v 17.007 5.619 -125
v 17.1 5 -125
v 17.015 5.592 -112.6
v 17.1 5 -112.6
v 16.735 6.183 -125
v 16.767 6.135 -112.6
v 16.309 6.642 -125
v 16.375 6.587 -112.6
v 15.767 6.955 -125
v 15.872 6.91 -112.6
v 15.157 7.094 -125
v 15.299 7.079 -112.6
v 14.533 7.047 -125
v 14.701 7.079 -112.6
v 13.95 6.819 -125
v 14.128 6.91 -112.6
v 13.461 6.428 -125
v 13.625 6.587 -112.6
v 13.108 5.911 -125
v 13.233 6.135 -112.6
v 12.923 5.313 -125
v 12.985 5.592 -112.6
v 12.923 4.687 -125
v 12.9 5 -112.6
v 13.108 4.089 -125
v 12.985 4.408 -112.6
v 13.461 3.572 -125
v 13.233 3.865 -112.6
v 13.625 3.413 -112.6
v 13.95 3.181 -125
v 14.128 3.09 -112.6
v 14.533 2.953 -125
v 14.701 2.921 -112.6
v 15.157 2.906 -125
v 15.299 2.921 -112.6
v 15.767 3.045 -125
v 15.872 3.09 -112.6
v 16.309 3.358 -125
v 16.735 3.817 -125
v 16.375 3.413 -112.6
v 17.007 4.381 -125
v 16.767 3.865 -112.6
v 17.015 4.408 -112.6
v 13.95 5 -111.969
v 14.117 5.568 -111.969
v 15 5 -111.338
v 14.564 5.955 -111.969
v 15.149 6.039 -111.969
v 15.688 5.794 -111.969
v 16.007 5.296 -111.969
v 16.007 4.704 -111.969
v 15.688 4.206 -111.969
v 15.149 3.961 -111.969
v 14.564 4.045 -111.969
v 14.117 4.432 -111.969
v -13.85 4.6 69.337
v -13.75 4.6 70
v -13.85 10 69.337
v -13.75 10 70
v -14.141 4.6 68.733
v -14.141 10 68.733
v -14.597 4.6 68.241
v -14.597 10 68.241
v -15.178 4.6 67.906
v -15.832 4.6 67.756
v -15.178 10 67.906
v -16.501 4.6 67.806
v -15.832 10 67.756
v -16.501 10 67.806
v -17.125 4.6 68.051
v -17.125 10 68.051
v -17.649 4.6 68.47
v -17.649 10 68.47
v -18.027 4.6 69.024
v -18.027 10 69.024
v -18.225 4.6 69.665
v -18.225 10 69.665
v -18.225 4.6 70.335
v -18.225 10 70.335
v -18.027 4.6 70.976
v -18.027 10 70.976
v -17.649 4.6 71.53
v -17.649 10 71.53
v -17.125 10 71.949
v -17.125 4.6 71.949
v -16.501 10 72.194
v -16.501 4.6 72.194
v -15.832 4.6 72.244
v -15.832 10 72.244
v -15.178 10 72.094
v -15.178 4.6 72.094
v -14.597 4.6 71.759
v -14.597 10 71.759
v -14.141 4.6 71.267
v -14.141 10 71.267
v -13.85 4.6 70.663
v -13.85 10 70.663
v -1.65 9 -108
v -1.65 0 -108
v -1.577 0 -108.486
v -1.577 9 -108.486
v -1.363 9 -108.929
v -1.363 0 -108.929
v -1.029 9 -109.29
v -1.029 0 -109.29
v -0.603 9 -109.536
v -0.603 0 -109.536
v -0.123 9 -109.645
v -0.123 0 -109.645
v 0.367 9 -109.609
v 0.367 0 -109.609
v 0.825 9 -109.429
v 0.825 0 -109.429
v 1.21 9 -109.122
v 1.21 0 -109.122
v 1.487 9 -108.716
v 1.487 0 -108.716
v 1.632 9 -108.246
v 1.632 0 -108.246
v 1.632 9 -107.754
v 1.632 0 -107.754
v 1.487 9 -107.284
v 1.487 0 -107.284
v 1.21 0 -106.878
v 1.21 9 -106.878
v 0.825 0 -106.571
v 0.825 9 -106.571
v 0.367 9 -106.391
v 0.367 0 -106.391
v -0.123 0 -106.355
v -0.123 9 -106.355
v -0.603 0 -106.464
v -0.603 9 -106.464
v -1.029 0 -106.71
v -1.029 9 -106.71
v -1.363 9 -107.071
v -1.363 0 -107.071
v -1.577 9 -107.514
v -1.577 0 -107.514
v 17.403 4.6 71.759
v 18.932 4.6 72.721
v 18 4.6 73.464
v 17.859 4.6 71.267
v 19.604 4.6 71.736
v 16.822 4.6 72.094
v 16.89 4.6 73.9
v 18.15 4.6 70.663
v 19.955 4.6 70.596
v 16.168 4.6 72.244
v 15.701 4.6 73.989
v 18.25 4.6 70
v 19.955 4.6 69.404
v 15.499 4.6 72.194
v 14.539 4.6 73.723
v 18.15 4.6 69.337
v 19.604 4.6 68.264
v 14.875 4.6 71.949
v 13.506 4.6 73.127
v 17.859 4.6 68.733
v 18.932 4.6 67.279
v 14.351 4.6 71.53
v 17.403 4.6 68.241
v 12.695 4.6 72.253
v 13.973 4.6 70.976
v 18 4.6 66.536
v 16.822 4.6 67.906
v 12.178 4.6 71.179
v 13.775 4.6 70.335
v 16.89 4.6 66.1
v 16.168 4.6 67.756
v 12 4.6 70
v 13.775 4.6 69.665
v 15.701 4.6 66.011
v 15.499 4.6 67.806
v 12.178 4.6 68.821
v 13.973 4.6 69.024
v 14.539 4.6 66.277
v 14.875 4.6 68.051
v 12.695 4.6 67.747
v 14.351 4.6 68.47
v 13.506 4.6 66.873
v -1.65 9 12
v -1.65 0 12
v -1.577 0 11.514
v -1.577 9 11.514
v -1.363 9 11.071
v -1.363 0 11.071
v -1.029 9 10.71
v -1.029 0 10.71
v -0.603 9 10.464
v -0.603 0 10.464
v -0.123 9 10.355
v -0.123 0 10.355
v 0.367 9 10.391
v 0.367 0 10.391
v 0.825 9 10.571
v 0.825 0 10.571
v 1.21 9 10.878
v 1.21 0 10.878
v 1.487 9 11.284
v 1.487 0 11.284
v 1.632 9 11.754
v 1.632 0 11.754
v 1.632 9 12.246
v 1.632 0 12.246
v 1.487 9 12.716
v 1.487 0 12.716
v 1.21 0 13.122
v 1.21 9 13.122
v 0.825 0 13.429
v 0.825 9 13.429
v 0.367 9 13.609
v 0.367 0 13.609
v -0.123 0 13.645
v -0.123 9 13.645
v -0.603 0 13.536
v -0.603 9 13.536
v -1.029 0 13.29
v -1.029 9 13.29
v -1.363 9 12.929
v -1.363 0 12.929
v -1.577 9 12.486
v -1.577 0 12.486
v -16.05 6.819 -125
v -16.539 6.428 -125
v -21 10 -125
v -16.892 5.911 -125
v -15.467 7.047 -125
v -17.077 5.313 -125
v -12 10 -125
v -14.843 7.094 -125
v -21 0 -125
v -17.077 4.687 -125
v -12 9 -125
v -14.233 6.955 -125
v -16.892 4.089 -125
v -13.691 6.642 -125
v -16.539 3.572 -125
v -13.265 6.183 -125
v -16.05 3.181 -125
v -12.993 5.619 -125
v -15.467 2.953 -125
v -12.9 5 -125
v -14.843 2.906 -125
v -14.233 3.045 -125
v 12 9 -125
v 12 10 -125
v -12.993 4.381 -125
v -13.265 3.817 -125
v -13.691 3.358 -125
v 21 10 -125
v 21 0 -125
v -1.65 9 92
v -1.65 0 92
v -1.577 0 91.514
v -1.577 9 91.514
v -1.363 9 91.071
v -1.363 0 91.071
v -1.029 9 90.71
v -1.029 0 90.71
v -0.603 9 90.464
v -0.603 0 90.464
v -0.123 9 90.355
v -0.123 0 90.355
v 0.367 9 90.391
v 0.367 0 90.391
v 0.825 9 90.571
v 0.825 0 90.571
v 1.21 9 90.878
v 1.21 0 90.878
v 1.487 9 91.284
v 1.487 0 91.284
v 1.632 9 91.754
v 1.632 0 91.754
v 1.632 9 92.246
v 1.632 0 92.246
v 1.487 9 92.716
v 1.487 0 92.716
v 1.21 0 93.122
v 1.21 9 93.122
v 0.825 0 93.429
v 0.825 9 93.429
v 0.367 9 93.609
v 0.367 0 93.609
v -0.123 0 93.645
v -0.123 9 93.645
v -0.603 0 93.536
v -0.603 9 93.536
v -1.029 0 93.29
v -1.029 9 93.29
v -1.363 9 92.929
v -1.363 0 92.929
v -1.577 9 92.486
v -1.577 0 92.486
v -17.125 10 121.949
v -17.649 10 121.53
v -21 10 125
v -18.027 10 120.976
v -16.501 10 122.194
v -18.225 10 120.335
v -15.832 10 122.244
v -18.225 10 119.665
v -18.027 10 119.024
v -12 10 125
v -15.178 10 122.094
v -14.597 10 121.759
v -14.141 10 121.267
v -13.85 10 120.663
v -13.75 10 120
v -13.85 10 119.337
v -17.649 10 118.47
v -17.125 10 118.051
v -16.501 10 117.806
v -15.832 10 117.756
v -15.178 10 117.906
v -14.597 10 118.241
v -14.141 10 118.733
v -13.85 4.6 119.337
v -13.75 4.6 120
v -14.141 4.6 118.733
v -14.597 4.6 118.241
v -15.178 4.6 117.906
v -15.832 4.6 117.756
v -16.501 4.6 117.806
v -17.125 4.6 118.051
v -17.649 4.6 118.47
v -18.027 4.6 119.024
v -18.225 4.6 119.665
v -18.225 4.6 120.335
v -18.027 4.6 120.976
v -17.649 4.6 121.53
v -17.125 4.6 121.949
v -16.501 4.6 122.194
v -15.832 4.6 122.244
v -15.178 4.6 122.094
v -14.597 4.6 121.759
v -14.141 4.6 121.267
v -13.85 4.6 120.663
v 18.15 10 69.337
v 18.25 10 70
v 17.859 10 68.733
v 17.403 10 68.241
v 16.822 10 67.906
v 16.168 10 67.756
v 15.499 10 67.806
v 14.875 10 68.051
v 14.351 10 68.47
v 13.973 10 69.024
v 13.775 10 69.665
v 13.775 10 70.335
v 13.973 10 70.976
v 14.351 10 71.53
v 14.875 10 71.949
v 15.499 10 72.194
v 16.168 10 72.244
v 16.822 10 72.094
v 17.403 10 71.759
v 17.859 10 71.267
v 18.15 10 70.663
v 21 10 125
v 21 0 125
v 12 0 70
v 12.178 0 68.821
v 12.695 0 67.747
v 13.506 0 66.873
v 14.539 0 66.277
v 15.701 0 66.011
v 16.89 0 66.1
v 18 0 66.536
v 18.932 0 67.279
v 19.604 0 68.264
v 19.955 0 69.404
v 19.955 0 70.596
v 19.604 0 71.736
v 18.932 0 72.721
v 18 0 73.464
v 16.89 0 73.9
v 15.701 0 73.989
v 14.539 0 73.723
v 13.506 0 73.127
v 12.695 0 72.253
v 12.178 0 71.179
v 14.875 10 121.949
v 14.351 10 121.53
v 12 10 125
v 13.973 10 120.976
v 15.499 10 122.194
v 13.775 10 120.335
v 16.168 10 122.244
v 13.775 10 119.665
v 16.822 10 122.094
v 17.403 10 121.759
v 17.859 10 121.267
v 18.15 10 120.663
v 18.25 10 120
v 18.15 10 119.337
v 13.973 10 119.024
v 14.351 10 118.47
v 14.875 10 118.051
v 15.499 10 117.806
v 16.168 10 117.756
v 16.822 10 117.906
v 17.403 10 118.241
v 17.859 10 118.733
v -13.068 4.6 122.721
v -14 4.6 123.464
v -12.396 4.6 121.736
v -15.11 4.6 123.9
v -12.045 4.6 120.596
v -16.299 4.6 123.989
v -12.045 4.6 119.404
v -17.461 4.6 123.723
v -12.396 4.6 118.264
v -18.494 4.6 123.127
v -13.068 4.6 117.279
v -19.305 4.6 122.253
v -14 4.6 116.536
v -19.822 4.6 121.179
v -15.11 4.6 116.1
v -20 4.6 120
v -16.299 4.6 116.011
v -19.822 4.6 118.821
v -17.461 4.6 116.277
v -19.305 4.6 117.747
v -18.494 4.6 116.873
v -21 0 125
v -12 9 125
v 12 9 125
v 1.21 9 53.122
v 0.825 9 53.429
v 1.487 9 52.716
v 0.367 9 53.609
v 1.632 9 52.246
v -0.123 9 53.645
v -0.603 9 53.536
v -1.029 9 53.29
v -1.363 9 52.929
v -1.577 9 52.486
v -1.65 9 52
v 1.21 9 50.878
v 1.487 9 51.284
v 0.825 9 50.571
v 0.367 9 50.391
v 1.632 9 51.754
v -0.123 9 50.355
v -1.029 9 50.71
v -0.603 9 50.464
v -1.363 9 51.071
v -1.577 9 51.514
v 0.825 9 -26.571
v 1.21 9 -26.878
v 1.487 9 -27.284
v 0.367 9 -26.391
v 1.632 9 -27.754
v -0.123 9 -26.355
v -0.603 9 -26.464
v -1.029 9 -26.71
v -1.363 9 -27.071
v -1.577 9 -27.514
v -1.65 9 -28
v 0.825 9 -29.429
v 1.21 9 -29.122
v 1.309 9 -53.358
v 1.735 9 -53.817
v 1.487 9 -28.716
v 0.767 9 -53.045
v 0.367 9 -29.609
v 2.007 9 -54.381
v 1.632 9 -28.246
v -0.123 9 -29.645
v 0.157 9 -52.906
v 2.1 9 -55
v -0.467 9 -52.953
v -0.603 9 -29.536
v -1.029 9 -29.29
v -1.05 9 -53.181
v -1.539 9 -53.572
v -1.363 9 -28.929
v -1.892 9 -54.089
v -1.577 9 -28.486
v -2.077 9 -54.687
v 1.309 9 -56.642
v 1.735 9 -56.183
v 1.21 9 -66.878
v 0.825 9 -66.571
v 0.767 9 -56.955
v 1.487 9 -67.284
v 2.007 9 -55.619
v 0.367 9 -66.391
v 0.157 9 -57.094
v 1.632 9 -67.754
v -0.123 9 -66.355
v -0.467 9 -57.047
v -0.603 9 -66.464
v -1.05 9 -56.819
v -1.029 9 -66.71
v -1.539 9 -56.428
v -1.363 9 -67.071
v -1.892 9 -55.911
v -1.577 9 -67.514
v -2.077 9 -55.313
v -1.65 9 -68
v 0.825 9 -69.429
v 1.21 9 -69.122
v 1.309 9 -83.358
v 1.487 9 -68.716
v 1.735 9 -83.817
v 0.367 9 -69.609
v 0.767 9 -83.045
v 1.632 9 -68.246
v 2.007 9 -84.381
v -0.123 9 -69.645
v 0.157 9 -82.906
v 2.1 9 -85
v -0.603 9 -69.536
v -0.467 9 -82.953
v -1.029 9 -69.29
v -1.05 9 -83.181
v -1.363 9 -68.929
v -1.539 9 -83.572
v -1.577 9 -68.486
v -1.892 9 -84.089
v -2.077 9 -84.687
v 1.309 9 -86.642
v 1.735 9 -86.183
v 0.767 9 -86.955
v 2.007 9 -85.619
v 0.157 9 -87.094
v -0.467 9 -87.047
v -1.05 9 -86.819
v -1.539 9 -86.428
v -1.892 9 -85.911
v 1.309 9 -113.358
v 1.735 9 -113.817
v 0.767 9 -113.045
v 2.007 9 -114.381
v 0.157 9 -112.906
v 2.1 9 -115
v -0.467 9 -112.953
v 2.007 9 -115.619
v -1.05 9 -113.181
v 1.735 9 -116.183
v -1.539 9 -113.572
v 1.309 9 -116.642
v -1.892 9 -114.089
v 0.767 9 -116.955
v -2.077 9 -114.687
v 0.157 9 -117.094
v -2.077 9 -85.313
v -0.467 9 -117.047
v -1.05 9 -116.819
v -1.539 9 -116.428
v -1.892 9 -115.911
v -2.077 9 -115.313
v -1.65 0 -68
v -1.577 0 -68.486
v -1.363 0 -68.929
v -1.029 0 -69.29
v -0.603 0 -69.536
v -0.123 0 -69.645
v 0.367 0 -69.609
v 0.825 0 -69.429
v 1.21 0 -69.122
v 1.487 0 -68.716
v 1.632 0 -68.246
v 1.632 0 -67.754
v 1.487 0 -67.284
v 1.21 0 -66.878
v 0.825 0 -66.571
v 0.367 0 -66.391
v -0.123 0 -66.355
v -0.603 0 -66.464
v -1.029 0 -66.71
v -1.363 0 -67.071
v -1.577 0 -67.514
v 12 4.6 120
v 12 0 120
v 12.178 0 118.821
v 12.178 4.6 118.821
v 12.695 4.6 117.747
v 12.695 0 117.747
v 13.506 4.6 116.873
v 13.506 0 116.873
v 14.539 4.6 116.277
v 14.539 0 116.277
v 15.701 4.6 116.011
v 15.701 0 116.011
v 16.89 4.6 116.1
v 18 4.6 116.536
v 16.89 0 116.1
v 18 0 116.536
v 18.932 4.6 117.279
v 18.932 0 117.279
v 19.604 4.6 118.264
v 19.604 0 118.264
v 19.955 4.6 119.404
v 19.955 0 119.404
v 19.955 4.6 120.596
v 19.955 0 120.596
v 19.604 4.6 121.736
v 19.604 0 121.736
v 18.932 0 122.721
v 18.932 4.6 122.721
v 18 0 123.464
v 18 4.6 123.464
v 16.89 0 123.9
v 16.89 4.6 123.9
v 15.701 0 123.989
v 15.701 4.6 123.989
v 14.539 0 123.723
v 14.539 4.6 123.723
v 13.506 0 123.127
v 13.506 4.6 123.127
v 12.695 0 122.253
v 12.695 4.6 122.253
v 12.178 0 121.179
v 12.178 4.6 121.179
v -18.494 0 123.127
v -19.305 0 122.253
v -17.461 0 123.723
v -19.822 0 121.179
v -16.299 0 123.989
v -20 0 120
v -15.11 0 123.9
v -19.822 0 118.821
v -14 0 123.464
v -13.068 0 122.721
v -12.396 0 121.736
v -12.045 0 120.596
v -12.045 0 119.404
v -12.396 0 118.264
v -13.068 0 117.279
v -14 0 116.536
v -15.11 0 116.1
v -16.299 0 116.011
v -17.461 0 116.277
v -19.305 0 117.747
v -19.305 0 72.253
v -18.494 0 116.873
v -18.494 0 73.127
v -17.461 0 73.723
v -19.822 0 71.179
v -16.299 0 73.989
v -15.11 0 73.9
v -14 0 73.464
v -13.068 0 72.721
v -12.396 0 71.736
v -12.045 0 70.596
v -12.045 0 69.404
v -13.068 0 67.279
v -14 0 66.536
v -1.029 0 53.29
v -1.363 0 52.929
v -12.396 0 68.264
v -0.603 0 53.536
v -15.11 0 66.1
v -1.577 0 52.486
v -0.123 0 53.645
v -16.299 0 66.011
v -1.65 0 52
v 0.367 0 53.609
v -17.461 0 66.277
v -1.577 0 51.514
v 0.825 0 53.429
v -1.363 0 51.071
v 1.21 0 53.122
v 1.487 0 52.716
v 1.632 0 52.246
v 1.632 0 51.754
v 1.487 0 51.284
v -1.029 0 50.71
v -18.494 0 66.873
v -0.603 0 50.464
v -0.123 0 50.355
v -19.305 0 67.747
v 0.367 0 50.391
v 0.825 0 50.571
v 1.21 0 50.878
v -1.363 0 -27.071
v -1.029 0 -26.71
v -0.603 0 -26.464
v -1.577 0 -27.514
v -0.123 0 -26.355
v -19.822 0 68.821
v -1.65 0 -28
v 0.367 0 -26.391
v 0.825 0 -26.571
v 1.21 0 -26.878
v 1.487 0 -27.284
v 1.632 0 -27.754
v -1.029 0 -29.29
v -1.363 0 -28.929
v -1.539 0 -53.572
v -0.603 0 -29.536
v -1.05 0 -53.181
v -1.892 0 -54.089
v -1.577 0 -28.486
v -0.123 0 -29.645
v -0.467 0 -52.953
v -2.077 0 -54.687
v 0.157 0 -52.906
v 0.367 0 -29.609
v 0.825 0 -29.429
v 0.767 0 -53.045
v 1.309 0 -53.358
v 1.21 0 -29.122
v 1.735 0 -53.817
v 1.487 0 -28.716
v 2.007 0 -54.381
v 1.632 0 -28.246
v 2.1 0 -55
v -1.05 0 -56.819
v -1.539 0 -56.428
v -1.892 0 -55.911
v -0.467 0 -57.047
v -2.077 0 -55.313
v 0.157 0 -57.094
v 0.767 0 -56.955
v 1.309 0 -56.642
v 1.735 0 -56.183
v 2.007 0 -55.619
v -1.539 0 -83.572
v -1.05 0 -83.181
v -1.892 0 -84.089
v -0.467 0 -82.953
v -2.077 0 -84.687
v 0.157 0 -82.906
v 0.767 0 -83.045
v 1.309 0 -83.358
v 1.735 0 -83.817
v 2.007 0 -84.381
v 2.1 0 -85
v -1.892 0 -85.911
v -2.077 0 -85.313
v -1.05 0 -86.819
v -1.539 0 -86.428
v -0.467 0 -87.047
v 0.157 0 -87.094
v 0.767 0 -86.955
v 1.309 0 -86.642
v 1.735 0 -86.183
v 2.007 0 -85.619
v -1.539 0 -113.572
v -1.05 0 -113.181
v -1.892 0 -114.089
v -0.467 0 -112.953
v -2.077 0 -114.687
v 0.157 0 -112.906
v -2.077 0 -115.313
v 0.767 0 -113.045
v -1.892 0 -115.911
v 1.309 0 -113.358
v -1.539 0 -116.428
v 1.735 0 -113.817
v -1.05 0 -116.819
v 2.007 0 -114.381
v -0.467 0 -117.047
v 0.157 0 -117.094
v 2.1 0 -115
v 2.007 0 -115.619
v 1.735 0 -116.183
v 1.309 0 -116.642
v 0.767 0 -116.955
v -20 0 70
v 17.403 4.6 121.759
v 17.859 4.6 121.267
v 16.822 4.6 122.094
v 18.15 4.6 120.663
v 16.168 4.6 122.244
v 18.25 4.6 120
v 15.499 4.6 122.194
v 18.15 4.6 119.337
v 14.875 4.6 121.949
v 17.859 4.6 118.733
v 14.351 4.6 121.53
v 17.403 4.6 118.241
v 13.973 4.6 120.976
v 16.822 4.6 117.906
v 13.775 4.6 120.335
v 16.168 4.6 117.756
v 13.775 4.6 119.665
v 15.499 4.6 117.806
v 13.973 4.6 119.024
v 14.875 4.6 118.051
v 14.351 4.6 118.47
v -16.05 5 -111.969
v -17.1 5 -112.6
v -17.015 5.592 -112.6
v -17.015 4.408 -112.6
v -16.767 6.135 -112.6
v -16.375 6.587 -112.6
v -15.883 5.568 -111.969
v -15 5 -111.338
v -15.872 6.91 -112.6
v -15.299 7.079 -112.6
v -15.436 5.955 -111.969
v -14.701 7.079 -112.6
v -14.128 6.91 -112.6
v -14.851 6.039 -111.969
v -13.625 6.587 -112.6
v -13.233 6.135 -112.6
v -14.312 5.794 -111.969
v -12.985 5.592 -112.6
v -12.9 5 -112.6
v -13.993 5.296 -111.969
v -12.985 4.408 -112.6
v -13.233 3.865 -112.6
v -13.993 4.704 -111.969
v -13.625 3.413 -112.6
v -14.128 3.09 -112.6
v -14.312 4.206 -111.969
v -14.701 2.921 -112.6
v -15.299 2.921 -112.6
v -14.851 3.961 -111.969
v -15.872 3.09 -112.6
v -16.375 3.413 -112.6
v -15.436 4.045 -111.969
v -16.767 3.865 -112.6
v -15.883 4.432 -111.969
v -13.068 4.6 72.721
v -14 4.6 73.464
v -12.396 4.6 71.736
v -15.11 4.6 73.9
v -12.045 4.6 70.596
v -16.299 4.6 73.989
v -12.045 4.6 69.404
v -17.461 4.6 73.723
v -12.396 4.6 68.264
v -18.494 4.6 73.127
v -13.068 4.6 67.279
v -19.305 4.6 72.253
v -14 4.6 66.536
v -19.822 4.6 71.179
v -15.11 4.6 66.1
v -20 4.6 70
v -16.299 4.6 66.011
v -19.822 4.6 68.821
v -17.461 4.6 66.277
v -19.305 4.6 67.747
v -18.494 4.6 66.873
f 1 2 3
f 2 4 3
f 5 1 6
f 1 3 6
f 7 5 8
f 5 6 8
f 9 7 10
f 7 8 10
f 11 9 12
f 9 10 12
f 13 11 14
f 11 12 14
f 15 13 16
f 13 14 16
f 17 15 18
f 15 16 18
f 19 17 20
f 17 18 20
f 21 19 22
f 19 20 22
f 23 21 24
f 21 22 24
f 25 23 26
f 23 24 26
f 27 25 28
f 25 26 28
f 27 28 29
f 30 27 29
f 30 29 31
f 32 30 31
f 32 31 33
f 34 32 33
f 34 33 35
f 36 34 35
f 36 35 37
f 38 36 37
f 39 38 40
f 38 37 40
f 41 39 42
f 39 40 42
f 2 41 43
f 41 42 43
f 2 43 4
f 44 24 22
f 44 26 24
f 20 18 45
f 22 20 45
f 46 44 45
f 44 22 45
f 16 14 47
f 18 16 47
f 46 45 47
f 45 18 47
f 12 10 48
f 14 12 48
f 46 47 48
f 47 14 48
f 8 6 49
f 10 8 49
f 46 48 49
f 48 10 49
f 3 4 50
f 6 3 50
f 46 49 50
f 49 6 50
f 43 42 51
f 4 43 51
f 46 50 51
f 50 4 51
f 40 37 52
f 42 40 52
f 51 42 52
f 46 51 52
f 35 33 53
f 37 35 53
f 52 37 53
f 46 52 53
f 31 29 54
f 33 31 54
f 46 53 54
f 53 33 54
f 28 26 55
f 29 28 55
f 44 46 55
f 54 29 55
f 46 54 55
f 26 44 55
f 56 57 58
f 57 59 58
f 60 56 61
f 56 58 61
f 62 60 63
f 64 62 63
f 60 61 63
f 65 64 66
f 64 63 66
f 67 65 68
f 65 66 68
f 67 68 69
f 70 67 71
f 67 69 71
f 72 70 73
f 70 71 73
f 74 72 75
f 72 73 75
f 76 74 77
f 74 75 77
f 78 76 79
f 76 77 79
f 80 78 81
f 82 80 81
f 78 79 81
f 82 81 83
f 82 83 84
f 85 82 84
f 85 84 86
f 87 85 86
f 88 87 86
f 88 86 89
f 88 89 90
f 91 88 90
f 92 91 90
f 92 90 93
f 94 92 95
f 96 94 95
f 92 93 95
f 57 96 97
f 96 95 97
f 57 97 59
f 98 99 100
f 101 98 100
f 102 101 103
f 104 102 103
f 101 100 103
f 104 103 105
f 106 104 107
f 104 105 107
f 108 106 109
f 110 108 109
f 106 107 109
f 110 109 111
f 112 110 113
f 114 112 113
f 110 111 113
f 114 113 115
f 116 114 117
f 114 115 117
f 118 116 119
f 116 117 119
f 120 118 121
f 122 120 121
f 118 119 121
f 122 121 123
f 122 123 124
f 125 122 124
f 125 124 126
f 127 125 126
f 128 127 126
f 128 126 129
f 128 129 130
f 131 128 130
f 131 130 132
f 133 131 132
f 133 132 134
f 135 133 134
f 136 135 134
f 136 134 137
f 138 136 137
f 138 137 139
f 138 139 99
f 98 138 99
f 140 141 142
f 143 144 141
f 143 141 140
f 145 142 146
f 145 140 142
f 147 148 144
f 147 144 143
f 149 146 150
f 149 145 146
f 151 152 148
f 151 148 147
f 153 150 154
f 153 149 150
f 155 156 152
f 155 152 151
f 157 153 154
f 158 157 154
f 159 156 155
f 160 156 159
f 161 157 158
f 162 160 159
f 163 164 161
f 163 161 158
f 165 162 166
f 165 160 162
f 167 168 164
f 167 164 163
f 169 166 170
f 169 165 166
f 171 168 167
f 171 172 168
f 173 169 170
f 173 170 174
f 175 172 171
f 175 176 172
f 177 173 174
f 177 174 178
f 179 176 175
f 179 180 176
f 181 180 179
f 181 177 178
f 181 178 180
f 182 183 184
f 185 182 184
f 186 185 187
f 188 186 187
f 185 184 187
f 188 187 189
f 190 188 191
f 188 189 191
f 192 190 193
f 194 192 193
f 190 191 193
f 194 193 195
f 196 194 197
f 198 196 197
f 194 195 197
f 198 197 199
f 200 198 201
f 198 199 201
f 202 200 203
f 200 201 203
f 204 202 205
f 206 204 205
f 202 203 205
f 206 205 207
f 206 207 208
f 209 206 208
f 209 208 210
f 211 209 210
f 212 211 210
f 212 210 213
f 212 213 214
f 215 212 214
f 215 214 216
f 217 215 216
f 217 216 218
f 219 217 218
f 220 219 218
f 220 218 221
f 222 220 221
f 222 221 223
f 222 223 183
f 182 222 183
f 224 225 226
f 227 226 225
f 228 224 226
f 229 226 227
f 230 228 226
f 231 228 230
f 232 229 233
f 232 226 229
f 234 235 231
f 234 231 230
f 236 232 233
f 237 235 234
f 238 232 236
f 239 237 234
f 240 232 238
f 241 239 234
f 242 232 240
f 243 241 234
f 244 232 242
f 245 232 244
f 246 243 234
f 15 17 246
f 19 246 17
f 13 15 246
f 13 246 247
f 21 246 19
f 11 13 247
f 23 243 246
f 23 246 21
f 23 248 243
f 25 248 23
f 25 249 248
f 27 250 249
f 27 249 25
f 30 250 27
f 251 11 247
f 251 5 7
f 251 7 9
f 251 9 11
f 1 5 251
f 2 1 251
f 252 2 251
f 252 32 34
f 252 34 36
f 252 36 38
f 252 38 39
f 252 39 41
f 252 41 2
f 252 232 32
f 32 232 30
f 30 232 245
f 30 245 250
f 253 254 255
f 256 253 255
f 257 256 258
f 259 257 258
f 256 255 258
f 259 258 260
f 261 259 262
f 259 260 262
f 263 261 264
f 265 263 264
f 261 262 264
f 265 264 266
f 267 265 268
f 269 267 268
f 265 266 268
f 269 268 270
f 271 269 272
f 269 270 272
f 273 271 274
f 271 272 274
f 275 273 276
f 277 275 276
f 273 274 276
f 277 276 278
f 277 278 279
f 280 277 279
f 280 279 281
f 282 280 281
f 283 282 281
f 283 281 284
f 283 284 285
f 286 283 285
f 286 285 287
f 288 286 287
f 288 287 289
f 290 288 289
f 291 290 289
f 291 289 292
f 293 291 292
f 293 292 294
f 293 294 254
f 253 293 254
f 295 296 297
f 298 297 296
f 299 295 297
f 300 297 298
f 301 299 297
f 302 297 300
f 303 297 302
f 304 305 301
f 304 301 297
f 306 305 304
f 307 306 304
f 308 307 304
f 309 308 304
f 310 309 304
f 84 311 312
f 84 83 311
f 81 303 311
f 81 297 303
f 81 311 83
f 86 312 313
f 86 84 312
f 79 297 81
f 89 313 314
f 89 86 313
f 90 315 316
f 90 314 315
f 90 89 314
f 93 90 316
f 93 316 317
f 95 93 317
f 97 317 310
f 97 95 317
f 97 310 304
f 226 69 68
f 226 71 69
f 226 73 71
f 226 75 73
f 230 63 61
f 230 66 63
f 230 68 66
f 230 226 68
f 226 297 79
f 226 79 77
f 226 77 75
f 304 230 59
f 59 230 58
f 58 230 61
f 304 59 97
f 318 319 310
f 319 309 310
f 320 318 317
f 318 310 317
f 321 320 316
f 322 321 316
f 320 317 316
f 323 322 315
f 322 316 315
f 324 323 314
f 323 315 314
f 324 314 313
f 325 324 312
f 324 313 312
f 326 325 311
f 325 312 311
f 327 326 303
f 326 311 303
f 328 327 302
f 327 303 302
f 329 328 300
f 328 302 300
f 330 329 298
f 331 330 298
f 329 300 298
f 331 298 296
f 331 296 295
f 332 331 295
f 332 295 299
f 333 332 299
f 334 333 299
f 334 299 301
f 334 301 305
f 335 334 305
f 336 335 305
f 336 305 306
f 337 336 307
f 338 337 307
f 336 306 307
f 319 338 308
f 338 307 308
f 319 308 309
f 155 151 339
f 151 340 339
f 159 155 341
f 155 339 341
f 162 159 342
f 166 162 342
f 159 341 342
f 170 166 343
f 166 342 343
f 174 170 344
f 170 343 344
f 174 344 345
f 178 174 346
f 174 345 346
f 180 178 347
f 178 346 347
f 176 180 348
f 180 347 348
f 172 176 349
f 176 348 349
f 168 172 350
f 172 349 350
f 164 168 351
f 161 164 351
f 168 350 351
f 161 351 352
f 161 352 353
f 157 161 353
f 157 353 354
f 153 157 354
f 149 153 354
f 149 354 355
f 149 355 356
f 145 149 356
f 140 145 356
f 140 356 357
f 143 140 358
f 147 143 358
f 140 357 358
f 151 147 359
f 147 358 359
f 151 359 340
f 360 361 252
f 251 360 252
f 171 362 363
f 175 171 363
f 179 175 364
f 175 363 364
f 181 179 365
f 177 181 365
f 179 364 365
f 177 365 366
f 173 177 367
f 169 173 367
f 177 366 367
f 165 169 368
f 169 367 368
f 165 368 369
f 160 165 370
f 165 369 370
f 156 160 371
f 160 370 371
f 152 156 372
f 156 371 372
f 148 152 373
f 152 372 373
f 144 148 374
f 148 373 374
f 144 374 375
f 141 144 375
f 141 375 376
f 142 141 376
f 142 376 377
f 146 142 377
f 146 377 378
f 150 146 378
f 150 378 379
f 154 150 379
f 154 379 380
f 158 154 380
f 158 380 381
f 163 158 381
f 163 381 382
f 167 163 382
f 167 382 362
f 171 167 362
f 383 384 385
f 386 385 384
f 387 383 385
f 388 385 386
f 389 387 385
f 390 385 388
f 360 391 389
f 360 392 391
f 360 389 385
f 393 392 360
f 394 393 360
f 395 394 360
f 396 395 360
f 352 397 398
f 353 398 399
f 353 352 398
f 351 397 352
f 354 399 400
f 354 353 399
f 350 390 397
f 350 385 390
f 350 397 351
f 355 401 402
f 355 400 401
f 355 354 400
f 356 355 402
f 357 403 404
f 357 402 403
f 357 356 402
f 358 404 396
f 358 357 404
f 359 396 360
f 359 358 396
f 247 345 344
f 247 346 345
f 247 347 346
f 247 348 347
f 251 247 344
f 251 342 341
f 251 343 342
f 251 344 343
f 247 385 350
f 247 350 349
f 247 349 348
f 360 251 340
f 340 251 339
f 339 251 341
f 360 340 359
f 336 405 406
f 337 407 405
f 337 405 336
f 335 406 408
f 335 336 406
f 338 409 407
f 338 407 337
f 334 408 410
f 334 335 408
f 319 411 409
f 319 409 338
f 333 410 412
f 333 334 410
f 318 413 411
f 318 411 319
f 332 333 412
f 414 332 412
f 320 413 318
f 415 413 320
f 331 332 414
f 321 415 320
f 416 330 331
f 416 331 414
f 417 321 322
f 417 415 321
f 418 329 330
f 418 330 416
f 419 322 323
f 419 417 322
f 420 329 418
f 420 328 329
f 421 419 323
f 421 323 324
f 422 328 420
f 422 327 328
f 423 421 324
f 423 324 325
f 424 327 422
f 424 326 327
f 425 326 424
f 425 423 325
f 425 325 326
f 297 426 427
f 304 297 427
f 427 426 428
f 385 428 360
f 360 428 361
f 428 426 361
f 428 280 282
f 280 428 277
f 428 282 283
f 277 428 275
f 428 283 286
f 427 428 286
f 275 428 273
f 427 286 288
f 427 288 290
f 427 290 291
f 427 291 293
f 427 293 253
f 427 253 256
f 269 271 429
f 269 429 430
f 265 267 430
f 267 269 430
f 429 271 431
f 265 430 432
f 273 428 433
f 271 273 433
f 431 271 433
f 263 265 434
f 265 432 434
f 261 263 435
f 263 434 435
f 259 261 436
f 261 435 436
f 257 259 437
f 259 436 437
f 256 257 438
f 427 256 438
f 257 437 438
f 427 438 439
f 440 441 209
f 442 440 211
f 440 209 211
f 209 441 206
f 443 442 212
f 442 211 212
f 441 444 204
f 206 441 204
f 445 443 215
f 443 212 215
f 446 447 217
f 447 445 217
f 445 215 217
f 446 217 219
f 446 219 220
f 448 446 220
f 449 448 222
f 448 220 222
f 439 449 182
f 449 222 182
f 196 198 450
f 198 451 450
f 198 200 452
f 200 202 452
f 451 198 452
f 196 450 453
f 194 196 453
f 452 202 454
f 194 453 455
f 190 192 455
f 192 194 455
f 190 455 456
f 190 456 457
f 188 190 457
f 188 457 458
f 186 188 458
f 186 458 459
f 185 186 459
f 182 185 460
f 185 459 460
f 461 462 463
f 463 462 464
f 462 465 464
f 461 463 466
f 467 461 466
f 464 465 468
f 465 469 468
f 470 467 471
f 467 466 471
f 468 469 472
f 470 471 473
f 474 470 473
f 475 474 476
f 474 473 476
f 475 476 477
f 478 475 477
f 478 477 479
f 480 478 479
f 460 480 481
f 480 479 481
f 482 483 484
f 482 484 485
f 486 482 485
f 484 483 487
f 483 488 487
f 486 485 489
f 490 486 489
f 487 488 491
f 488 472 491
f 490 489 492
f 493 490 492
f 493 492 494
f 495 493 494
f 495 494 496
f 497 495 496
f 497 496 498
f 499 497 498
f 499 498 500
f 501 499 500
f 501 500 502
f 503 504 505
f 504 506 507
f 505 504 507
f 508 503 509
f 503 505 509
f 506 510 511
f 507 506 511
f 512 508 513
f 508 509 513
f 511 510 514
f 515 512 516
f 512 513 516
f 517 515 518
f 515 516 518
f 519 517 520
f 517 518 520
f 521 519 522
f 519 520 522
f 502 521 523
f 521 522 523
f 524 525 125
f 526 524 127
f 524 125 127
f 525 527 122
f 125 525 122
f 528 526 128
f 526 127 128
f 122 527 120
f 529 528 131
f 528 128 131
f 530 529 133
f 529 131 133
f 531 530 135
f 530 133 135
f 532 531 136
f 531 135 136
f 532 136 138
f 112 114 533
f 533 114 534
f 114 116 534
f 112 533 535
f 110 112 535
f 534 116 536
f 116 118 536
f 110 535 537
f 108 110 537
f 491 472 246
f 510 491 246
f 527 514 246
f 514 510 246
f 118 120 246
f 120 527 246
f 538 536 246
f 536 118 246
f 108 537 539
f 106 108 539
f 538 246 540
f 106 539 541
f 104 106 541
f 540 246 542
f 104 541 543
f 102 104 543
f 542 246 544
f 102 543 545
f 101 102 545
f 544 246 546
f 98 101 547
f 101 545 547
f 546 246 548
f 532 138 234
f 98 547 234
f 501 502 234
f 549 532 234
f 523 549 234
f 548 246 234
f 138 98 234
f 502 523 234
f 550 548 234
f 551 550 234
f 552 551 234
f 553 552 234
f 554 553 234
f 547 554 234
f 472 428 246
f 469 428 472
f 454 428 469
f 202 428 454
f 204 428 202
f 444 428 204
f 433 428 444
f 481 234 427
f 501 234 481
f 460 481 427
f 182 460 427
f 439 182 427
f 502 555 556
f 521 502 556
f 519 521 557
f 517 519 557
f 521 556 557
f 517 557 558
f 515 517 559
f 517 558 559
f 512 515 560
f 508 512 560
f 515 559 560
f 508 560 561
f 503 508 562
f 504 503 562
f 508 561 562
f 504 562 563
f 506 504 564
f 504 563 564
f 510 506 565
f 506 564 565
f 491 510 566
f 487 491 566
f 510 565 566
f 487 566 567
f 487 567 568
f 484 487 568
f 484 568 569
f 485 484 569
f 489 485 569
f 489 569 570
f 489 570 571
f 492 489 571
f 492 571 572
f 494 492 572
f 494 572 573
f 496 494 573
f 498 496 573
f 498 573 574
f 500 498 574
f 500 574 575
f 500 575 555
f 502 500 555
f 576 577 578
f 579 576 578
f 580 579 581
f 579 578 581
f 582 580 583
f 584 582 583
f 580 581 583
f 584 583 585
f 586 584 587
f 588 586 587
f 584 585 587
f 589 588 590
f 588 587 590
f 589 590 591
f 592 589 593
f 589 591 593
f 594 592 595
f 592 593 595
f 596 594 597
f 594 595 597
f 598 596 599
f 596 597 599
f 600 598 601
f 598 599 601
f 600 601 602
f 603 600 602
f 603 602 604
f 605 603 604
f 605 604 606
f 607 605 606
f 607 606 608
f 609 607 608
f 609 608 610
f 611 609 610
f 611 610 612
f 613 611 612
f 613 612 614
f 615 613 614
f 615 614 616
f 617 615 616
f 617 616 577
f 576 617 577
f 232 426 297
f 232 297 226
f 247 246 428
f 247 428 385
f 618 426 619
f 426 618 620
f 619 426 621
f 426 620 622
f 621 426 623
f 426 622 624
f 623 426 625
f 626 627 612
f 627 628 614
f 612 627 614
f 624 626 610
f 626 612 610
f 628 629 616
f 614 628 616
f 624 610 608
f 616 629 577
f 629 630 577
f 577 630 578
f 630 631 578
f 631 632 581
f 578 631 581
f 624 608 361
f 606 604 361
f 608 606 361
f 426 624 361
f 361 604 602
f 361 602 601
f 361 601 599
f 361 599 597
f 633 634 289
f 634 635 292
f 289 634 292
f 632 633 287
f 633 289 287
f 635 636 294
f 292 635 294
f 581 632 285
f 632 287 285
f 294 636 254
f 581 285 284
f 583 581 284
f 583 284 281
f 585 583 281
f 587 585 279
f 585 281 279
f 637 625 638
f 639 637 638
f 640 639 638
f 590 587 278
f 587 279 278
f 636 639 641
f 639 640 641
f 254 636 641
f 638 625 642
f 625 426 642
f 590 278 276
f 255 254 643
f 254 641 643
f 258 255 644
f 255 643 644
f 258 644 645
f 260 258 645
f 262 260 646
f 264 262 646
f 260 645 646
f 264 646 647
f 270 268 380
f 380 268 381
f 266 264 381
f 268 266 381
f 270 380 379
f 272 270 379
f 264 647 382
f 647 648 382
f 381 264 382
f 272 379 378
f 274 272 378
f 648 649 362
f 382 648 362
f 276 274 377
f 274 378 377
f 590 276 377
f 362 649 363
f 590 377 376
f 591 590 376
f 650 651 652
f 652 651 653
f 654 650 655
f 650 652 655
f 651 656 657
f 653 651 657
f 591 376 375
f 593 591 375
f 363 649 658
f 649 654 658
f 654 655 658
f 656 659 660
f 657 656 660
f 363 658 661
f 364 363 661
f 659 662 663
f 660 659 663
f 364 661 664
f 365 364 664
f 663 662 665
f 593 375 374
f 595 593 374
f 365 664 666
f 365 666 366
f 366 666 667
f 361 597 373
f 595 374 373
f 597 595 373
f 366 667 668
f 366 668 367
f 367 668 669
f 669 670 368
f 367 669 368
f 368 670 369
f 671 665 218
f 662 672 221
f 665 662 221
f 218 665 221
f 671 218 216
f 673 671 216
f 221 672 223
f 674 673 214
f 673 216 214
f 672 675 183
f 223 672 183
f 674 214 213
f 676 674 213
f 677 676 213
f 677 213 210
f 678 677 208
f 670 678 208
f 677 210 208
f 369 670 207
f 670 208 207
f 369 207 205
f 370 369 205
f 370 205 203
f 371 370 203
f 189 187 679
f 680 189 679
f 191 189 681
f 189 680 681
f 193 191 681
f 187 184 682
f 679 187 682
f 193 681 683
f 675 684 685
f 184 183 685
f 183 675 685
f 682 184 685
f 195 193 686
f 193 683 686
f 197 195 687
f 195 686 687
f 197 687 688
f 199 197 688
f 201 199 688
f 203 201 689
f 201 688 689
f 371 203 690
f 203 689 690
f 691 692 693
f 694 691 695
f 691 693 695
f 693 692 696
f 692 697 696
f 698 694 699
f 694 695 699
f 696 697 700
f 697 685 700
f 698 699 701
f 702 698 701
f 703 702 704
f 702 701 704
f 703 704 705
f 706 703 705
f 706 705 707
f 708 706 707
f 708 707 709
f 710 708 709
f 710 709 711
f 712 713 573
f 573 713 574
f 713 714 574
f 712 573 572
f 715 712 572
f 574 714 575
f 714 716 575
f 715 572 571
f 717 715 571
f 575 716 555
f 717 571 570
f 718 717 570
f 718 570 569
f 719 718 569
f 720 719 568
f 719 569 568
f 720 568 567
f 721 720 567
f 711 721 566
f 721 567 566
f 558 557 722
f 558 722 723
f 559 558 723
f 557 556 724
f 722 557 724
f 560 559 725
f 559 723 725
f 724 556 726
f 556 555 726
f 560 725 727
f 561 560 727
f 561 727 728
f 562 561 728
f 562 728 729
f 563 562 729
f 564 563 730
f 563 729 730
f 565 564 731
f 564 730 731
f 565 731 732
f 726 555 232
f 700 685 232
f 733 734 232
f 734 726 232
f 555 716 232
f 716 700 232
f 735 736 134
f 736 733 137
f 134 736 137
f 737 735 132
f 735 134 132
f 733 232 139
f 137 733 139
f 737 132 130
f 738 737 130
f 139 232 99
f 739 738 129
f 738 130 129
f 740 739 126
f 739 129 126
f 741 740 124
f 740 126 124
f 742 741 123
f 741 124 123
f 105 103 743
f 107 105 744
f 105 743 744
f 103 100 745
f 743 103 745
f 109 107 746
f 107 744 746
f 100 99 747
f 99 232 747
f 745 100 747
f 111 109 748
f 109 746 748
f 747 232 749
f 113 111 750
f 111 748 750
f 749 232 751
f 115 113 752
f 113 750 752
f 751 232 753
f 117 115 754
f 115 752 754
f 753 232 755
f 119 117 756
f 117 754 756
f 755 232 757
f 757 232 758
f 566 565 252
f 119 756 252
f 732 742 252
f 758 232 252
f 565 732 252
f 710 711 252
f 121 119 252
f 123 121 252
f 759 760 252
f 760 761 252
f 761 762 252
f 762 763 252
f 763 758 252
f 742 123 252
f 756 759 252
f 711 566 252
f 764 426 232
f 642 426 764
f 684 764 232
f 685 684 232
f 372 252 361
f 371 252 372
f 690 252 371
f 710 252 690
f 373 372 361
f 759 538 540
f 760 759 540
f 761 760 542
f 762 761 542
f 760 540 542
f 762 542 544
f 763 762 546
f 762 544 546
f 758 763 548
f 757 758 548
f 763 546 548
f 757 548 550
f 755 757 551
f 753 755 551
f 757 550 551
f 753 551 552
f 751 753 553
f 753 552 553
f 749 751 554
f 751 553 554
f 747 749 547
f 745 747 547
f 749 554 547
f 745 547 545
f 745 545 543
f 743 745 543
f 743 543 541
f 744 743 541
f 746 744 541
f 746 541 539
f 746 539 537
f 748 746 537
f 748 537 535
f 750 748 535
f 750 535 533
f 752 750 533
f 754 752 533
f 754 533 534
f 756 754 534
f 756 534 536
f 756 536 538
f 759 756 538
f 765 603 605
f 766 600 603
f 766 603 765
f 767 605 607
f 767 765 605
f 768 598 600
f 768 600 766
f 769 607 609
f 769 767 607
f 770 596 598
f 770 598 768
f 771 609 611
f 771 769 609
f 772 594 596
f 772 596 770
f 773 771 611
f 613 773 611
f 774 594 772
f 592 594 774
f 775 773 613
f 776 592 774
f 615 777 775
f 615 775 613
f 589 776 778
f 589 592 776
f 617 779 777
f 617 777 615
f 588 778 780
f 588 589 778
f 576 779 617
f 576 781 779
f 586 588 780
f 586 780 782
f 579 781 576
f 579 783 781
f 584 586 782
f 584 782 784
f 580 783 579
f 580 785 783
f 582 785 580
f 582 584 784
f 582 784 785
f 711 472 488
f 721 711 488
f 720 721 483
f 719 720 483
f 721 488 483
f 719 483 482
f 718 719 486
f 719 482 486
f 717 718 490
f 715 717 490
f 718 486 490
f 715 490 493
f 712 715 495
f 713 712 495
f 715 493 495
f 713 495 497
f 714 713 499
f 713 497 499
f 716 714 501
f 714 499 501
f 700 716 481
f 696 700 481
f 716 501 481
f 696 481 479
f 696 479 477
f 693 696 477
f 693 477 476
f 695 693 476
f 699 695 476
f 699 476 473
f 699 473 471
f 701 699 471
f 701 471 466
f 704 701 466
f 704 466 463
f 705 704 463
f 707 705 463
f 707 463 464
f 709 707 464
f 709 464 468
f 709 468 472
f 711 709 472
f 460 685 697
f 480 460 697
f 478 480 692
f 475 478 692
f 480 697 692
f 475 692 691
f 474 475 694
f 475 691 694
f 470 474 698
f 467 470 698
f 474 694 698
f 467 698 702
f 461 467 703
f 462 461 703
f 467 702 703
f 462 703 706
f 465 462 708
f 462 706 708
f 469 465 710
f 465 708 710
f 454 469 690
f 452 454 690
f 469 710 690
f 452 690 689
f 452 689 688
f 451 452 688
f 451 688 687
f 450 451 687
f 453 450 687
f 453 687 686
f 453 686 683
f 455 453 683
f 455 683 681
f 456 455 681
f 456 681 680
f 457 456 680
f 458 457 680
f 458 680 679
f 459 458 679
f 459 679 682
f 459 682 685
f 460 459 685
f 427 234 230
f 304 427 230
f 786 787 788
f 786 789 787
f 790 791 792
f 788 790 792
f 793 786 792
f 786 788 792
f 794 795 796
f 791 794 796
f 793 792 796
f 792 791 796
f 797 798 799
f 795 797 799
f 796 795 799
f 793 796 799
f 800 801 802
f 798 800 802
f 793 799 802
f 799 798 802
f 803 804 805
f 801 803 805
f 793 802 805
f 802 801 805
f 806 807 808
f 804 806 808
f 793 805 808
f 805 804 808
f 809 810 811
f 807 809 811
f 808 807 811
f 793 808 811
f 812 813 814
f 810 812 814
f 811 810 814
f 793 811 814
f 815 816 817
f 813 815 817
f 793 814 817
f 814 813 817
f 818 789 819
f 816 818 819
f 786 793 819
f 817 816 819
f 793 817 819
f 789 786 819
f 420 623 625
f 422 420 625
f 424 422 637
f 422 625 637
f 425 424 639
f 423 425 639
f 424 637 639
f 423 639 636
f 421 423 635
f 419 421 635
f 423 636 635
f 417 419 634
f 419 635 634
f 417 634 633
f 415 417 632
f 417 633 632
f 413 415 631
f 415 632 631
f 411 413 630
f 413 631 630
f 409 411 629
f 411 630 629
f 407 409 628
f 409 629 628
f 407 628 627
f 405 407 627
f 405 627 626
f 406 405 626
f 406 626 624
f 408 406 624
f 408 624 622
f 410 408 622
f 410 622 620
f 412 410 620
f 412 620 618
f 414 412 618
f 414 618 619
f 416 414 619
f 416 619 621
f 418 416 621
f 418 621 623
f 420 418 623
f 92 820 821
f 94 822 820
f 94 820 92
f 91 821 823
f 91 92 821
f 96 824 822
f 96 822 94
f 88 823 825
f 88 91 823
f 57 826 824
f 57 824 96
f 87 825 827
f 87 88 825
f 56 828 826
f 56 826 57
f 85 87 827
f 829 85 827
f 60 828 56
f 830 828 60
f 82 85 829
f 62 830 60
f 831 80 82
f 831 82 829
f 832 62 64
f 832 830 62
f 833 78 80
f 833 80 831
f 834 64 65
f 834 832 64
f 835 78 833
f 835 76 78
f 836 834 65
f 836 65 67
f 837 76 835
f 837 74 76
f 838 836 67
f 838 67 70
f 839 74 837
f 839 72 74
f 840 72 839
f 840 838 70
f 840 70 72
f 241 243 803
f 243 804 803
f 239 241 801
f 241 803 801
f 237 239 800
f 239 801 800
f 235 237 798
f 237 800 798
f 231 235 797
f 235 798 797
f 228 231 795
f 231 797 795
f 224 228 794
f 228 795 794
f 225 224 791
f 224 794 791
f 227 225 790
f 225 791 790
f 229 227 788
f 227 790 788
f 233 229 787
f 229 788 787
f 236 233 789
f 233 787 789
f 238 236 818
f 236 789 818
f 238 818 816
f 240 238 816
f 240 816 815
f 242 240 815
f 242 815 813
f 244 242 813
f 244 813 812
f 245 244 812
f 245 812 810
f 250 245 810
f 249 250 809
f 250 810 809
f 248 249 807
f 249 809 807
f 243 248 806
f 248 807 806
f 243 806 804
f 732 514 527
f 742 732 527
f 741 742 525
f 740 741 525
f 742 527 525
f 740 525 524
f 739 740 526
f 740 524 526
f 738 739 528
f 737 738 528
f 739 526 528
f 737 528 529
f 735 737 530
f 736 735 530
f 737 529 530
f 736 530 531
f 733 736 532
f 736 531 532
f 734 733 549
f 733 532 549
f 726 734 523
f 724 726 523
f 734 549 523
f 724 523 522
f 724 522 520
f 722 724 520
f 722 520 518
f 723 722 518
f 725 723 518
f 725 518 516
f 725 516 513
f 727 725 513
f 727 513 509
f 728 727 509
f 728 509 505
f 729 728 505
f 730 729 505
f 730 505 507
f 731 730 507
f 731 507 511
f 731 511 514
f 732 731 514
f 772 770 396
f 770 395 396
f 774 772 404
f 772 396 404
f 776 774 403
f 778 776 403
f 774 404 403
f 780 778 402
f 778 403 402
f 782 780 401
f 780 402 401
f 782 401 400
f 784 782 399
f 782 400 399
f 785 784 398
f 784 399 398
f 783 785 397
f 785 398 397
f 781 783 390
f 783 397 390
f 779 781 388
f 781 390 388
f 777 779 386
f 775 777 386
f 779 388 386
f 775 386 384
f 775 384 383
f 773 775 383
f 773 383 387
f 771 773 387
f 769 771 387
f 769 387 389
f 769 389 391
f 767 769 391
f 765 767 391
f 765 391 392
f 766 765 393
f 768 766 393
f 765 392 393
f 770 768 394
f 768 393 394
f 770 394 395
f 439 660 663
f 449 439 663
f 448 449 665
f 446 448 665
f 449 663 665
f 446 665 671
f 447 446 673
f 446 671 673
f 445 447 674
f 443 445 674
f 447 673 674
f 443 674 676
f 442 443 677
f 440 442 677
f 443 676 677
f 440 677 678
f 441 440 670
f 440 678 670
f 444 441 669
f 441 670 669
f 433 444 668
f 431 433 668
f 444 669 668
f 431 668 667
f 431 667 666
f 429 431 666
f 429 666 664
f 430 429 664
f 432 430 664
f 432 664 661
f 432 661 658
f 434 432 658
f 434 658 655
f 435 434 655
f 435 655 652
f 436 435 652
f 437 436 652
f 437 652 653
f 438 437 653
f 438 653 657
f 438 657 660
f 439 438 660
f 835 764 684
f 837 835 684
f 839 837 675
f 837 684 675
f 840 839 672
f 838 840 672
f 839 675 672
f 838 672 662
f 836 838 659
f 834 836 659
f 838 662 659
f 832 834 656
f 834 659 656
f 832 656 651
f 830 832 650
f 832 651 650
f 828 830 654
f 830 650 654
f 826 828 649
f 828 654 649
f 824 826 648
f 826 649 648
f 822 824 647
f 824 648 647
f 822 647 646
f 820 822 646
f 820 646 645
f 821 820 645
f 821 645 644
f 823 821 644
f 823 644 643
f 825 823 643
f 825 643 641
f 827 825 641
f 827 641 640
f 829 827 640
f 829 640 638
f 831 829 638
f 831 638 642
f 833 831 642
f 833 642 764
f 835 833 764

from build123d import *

# Parameters (mm, degrees)
SKETCH_1_W                = 42
SKETCH_1_H                = 250
EXTRUDE_1_DEPTH           = 10
SKETCH_10_W               = 24
SKETCH_10_H               = 1
CUT_EXTRUDE_1_DEPTH       = 252.079668631
HOLE_WIZARD_M4_1_D        = 3.3
PATTERN_LINEAR_1_COUNT    = 6
PATTERN_LINEAR_1_PITCH    = 40
HOLE_WIZARD_M5_1_D        = 4.2
HOLE_WIZARD_1_D           = 4.5
HOLE_WIZARD_1_CBORE_D     = 8
HOLE_WIZARD_1_CBORE_DEPTH = 4.6
HOLE_WIZARD_M5_2_D        = 4.2
HOLE_WIZARD_M5_2_DEPTH    = 12.4
HOLE_WIZARD_M5_2_TIP      = 1.2618073


with BuildPart() as part:
    # 草图1 → 凸台-拉伸1 (new body)
    with BuildSketch(Plane(origin=(0, 0, 0), x_dir=(1, 0, 0), z_dir=(0, 1, 0))):
        Rectangle(SKETCH_1_W, SKETCH_1_H)
    extrude(amount=EXTRUDE_1_DEPTH)

    # 草图10 → 切除-拉伸1 (cut, through all)
    with BuildSketch(Plane(origin=(0, 0, -125), x_dir=(-1, 0, 0), z_dir=(0, 0, -1))):
        with Locations((0, 9.5)):
            Rectangle(SKETCH_10_W, SKETCH_10_H)
    extrude(amount=-CUT_EXTRUDE_1_DEPTH, mode=Mode.SUBTRACT)

    # M4 螺纹孔1 (through all)
    with Locations(Plane(origin=(-1.725383056, 9, -76.289623168), x_dir=(1, 0, 0), z_dir=(0, 1, 0))):
        with Locations((1.725383056, 31.710376832)):
            hole_wizard_m4_1 = Hole(HOLE_WIZARD_M4_1_D / 2)

    # 阵列(线性)1: M4 螺纹孔1 ×6
    with Locations(*[(0, 0, i * PATTERN_LINEAR_1_PITCH) for i in range(1, PATTERN_LINEAR_1_COUNT)]):
        add(hole_wizard_m4_1, mode=Mode.SUBTRACT)

    # M5 螺纹孔1 (through all)
    with Locations(Plane(origin=(0, 0, 0), x_dir=(-1, 0, 0), z_dir=(0, -1, 0))):
        with Locations((0, 55), (0, 115), (0, 85)):
            Hole(HOLE_WIZARD_M5_1_D / 2)

    # 打孔尺寸根据内六角圆柱头螺钉的类型1 (through all)
    with Locations(Plane(origin=(0, 0, 0), x_dir=(-1, 0, 0), z_dir=(0, -1, 0))):
        with Locations((16, -120), (16, -70), (-16, -70), (-16, -120)):
            CounterBoreHole(HOLE_WIZARD_1_D / 2, HOLE_WIZARD_1_CBORE_D / 2, HOLE_WIZARD_1_CBORE_DEPTH)

    # M5 螺纹孔2
    with Locations(Plane(origin=(0, 0, -125), x_dir=(-1, 0, 0), z_dir=(0, 0, -1))):
        with Locations((-15, 5), (15, 5)):
            Hole(HOLE_WIZARD_M5_2_D / 2, depth=HOLE_WIZARD_M5_2_DEPTH)
            with Locations((0, 0, -(HOLE_WIZARD_M5_2_DEPTH + HOLE_WIZARD_M5_2_TIP / 2))):  # 118° drill point
                Cone(0, HOLE_WIZARD_M5_2_D / 2, HOLE_WIZARD_M5_2_TIP, mode=Mode.SUBTRACT)


solid = part.part
